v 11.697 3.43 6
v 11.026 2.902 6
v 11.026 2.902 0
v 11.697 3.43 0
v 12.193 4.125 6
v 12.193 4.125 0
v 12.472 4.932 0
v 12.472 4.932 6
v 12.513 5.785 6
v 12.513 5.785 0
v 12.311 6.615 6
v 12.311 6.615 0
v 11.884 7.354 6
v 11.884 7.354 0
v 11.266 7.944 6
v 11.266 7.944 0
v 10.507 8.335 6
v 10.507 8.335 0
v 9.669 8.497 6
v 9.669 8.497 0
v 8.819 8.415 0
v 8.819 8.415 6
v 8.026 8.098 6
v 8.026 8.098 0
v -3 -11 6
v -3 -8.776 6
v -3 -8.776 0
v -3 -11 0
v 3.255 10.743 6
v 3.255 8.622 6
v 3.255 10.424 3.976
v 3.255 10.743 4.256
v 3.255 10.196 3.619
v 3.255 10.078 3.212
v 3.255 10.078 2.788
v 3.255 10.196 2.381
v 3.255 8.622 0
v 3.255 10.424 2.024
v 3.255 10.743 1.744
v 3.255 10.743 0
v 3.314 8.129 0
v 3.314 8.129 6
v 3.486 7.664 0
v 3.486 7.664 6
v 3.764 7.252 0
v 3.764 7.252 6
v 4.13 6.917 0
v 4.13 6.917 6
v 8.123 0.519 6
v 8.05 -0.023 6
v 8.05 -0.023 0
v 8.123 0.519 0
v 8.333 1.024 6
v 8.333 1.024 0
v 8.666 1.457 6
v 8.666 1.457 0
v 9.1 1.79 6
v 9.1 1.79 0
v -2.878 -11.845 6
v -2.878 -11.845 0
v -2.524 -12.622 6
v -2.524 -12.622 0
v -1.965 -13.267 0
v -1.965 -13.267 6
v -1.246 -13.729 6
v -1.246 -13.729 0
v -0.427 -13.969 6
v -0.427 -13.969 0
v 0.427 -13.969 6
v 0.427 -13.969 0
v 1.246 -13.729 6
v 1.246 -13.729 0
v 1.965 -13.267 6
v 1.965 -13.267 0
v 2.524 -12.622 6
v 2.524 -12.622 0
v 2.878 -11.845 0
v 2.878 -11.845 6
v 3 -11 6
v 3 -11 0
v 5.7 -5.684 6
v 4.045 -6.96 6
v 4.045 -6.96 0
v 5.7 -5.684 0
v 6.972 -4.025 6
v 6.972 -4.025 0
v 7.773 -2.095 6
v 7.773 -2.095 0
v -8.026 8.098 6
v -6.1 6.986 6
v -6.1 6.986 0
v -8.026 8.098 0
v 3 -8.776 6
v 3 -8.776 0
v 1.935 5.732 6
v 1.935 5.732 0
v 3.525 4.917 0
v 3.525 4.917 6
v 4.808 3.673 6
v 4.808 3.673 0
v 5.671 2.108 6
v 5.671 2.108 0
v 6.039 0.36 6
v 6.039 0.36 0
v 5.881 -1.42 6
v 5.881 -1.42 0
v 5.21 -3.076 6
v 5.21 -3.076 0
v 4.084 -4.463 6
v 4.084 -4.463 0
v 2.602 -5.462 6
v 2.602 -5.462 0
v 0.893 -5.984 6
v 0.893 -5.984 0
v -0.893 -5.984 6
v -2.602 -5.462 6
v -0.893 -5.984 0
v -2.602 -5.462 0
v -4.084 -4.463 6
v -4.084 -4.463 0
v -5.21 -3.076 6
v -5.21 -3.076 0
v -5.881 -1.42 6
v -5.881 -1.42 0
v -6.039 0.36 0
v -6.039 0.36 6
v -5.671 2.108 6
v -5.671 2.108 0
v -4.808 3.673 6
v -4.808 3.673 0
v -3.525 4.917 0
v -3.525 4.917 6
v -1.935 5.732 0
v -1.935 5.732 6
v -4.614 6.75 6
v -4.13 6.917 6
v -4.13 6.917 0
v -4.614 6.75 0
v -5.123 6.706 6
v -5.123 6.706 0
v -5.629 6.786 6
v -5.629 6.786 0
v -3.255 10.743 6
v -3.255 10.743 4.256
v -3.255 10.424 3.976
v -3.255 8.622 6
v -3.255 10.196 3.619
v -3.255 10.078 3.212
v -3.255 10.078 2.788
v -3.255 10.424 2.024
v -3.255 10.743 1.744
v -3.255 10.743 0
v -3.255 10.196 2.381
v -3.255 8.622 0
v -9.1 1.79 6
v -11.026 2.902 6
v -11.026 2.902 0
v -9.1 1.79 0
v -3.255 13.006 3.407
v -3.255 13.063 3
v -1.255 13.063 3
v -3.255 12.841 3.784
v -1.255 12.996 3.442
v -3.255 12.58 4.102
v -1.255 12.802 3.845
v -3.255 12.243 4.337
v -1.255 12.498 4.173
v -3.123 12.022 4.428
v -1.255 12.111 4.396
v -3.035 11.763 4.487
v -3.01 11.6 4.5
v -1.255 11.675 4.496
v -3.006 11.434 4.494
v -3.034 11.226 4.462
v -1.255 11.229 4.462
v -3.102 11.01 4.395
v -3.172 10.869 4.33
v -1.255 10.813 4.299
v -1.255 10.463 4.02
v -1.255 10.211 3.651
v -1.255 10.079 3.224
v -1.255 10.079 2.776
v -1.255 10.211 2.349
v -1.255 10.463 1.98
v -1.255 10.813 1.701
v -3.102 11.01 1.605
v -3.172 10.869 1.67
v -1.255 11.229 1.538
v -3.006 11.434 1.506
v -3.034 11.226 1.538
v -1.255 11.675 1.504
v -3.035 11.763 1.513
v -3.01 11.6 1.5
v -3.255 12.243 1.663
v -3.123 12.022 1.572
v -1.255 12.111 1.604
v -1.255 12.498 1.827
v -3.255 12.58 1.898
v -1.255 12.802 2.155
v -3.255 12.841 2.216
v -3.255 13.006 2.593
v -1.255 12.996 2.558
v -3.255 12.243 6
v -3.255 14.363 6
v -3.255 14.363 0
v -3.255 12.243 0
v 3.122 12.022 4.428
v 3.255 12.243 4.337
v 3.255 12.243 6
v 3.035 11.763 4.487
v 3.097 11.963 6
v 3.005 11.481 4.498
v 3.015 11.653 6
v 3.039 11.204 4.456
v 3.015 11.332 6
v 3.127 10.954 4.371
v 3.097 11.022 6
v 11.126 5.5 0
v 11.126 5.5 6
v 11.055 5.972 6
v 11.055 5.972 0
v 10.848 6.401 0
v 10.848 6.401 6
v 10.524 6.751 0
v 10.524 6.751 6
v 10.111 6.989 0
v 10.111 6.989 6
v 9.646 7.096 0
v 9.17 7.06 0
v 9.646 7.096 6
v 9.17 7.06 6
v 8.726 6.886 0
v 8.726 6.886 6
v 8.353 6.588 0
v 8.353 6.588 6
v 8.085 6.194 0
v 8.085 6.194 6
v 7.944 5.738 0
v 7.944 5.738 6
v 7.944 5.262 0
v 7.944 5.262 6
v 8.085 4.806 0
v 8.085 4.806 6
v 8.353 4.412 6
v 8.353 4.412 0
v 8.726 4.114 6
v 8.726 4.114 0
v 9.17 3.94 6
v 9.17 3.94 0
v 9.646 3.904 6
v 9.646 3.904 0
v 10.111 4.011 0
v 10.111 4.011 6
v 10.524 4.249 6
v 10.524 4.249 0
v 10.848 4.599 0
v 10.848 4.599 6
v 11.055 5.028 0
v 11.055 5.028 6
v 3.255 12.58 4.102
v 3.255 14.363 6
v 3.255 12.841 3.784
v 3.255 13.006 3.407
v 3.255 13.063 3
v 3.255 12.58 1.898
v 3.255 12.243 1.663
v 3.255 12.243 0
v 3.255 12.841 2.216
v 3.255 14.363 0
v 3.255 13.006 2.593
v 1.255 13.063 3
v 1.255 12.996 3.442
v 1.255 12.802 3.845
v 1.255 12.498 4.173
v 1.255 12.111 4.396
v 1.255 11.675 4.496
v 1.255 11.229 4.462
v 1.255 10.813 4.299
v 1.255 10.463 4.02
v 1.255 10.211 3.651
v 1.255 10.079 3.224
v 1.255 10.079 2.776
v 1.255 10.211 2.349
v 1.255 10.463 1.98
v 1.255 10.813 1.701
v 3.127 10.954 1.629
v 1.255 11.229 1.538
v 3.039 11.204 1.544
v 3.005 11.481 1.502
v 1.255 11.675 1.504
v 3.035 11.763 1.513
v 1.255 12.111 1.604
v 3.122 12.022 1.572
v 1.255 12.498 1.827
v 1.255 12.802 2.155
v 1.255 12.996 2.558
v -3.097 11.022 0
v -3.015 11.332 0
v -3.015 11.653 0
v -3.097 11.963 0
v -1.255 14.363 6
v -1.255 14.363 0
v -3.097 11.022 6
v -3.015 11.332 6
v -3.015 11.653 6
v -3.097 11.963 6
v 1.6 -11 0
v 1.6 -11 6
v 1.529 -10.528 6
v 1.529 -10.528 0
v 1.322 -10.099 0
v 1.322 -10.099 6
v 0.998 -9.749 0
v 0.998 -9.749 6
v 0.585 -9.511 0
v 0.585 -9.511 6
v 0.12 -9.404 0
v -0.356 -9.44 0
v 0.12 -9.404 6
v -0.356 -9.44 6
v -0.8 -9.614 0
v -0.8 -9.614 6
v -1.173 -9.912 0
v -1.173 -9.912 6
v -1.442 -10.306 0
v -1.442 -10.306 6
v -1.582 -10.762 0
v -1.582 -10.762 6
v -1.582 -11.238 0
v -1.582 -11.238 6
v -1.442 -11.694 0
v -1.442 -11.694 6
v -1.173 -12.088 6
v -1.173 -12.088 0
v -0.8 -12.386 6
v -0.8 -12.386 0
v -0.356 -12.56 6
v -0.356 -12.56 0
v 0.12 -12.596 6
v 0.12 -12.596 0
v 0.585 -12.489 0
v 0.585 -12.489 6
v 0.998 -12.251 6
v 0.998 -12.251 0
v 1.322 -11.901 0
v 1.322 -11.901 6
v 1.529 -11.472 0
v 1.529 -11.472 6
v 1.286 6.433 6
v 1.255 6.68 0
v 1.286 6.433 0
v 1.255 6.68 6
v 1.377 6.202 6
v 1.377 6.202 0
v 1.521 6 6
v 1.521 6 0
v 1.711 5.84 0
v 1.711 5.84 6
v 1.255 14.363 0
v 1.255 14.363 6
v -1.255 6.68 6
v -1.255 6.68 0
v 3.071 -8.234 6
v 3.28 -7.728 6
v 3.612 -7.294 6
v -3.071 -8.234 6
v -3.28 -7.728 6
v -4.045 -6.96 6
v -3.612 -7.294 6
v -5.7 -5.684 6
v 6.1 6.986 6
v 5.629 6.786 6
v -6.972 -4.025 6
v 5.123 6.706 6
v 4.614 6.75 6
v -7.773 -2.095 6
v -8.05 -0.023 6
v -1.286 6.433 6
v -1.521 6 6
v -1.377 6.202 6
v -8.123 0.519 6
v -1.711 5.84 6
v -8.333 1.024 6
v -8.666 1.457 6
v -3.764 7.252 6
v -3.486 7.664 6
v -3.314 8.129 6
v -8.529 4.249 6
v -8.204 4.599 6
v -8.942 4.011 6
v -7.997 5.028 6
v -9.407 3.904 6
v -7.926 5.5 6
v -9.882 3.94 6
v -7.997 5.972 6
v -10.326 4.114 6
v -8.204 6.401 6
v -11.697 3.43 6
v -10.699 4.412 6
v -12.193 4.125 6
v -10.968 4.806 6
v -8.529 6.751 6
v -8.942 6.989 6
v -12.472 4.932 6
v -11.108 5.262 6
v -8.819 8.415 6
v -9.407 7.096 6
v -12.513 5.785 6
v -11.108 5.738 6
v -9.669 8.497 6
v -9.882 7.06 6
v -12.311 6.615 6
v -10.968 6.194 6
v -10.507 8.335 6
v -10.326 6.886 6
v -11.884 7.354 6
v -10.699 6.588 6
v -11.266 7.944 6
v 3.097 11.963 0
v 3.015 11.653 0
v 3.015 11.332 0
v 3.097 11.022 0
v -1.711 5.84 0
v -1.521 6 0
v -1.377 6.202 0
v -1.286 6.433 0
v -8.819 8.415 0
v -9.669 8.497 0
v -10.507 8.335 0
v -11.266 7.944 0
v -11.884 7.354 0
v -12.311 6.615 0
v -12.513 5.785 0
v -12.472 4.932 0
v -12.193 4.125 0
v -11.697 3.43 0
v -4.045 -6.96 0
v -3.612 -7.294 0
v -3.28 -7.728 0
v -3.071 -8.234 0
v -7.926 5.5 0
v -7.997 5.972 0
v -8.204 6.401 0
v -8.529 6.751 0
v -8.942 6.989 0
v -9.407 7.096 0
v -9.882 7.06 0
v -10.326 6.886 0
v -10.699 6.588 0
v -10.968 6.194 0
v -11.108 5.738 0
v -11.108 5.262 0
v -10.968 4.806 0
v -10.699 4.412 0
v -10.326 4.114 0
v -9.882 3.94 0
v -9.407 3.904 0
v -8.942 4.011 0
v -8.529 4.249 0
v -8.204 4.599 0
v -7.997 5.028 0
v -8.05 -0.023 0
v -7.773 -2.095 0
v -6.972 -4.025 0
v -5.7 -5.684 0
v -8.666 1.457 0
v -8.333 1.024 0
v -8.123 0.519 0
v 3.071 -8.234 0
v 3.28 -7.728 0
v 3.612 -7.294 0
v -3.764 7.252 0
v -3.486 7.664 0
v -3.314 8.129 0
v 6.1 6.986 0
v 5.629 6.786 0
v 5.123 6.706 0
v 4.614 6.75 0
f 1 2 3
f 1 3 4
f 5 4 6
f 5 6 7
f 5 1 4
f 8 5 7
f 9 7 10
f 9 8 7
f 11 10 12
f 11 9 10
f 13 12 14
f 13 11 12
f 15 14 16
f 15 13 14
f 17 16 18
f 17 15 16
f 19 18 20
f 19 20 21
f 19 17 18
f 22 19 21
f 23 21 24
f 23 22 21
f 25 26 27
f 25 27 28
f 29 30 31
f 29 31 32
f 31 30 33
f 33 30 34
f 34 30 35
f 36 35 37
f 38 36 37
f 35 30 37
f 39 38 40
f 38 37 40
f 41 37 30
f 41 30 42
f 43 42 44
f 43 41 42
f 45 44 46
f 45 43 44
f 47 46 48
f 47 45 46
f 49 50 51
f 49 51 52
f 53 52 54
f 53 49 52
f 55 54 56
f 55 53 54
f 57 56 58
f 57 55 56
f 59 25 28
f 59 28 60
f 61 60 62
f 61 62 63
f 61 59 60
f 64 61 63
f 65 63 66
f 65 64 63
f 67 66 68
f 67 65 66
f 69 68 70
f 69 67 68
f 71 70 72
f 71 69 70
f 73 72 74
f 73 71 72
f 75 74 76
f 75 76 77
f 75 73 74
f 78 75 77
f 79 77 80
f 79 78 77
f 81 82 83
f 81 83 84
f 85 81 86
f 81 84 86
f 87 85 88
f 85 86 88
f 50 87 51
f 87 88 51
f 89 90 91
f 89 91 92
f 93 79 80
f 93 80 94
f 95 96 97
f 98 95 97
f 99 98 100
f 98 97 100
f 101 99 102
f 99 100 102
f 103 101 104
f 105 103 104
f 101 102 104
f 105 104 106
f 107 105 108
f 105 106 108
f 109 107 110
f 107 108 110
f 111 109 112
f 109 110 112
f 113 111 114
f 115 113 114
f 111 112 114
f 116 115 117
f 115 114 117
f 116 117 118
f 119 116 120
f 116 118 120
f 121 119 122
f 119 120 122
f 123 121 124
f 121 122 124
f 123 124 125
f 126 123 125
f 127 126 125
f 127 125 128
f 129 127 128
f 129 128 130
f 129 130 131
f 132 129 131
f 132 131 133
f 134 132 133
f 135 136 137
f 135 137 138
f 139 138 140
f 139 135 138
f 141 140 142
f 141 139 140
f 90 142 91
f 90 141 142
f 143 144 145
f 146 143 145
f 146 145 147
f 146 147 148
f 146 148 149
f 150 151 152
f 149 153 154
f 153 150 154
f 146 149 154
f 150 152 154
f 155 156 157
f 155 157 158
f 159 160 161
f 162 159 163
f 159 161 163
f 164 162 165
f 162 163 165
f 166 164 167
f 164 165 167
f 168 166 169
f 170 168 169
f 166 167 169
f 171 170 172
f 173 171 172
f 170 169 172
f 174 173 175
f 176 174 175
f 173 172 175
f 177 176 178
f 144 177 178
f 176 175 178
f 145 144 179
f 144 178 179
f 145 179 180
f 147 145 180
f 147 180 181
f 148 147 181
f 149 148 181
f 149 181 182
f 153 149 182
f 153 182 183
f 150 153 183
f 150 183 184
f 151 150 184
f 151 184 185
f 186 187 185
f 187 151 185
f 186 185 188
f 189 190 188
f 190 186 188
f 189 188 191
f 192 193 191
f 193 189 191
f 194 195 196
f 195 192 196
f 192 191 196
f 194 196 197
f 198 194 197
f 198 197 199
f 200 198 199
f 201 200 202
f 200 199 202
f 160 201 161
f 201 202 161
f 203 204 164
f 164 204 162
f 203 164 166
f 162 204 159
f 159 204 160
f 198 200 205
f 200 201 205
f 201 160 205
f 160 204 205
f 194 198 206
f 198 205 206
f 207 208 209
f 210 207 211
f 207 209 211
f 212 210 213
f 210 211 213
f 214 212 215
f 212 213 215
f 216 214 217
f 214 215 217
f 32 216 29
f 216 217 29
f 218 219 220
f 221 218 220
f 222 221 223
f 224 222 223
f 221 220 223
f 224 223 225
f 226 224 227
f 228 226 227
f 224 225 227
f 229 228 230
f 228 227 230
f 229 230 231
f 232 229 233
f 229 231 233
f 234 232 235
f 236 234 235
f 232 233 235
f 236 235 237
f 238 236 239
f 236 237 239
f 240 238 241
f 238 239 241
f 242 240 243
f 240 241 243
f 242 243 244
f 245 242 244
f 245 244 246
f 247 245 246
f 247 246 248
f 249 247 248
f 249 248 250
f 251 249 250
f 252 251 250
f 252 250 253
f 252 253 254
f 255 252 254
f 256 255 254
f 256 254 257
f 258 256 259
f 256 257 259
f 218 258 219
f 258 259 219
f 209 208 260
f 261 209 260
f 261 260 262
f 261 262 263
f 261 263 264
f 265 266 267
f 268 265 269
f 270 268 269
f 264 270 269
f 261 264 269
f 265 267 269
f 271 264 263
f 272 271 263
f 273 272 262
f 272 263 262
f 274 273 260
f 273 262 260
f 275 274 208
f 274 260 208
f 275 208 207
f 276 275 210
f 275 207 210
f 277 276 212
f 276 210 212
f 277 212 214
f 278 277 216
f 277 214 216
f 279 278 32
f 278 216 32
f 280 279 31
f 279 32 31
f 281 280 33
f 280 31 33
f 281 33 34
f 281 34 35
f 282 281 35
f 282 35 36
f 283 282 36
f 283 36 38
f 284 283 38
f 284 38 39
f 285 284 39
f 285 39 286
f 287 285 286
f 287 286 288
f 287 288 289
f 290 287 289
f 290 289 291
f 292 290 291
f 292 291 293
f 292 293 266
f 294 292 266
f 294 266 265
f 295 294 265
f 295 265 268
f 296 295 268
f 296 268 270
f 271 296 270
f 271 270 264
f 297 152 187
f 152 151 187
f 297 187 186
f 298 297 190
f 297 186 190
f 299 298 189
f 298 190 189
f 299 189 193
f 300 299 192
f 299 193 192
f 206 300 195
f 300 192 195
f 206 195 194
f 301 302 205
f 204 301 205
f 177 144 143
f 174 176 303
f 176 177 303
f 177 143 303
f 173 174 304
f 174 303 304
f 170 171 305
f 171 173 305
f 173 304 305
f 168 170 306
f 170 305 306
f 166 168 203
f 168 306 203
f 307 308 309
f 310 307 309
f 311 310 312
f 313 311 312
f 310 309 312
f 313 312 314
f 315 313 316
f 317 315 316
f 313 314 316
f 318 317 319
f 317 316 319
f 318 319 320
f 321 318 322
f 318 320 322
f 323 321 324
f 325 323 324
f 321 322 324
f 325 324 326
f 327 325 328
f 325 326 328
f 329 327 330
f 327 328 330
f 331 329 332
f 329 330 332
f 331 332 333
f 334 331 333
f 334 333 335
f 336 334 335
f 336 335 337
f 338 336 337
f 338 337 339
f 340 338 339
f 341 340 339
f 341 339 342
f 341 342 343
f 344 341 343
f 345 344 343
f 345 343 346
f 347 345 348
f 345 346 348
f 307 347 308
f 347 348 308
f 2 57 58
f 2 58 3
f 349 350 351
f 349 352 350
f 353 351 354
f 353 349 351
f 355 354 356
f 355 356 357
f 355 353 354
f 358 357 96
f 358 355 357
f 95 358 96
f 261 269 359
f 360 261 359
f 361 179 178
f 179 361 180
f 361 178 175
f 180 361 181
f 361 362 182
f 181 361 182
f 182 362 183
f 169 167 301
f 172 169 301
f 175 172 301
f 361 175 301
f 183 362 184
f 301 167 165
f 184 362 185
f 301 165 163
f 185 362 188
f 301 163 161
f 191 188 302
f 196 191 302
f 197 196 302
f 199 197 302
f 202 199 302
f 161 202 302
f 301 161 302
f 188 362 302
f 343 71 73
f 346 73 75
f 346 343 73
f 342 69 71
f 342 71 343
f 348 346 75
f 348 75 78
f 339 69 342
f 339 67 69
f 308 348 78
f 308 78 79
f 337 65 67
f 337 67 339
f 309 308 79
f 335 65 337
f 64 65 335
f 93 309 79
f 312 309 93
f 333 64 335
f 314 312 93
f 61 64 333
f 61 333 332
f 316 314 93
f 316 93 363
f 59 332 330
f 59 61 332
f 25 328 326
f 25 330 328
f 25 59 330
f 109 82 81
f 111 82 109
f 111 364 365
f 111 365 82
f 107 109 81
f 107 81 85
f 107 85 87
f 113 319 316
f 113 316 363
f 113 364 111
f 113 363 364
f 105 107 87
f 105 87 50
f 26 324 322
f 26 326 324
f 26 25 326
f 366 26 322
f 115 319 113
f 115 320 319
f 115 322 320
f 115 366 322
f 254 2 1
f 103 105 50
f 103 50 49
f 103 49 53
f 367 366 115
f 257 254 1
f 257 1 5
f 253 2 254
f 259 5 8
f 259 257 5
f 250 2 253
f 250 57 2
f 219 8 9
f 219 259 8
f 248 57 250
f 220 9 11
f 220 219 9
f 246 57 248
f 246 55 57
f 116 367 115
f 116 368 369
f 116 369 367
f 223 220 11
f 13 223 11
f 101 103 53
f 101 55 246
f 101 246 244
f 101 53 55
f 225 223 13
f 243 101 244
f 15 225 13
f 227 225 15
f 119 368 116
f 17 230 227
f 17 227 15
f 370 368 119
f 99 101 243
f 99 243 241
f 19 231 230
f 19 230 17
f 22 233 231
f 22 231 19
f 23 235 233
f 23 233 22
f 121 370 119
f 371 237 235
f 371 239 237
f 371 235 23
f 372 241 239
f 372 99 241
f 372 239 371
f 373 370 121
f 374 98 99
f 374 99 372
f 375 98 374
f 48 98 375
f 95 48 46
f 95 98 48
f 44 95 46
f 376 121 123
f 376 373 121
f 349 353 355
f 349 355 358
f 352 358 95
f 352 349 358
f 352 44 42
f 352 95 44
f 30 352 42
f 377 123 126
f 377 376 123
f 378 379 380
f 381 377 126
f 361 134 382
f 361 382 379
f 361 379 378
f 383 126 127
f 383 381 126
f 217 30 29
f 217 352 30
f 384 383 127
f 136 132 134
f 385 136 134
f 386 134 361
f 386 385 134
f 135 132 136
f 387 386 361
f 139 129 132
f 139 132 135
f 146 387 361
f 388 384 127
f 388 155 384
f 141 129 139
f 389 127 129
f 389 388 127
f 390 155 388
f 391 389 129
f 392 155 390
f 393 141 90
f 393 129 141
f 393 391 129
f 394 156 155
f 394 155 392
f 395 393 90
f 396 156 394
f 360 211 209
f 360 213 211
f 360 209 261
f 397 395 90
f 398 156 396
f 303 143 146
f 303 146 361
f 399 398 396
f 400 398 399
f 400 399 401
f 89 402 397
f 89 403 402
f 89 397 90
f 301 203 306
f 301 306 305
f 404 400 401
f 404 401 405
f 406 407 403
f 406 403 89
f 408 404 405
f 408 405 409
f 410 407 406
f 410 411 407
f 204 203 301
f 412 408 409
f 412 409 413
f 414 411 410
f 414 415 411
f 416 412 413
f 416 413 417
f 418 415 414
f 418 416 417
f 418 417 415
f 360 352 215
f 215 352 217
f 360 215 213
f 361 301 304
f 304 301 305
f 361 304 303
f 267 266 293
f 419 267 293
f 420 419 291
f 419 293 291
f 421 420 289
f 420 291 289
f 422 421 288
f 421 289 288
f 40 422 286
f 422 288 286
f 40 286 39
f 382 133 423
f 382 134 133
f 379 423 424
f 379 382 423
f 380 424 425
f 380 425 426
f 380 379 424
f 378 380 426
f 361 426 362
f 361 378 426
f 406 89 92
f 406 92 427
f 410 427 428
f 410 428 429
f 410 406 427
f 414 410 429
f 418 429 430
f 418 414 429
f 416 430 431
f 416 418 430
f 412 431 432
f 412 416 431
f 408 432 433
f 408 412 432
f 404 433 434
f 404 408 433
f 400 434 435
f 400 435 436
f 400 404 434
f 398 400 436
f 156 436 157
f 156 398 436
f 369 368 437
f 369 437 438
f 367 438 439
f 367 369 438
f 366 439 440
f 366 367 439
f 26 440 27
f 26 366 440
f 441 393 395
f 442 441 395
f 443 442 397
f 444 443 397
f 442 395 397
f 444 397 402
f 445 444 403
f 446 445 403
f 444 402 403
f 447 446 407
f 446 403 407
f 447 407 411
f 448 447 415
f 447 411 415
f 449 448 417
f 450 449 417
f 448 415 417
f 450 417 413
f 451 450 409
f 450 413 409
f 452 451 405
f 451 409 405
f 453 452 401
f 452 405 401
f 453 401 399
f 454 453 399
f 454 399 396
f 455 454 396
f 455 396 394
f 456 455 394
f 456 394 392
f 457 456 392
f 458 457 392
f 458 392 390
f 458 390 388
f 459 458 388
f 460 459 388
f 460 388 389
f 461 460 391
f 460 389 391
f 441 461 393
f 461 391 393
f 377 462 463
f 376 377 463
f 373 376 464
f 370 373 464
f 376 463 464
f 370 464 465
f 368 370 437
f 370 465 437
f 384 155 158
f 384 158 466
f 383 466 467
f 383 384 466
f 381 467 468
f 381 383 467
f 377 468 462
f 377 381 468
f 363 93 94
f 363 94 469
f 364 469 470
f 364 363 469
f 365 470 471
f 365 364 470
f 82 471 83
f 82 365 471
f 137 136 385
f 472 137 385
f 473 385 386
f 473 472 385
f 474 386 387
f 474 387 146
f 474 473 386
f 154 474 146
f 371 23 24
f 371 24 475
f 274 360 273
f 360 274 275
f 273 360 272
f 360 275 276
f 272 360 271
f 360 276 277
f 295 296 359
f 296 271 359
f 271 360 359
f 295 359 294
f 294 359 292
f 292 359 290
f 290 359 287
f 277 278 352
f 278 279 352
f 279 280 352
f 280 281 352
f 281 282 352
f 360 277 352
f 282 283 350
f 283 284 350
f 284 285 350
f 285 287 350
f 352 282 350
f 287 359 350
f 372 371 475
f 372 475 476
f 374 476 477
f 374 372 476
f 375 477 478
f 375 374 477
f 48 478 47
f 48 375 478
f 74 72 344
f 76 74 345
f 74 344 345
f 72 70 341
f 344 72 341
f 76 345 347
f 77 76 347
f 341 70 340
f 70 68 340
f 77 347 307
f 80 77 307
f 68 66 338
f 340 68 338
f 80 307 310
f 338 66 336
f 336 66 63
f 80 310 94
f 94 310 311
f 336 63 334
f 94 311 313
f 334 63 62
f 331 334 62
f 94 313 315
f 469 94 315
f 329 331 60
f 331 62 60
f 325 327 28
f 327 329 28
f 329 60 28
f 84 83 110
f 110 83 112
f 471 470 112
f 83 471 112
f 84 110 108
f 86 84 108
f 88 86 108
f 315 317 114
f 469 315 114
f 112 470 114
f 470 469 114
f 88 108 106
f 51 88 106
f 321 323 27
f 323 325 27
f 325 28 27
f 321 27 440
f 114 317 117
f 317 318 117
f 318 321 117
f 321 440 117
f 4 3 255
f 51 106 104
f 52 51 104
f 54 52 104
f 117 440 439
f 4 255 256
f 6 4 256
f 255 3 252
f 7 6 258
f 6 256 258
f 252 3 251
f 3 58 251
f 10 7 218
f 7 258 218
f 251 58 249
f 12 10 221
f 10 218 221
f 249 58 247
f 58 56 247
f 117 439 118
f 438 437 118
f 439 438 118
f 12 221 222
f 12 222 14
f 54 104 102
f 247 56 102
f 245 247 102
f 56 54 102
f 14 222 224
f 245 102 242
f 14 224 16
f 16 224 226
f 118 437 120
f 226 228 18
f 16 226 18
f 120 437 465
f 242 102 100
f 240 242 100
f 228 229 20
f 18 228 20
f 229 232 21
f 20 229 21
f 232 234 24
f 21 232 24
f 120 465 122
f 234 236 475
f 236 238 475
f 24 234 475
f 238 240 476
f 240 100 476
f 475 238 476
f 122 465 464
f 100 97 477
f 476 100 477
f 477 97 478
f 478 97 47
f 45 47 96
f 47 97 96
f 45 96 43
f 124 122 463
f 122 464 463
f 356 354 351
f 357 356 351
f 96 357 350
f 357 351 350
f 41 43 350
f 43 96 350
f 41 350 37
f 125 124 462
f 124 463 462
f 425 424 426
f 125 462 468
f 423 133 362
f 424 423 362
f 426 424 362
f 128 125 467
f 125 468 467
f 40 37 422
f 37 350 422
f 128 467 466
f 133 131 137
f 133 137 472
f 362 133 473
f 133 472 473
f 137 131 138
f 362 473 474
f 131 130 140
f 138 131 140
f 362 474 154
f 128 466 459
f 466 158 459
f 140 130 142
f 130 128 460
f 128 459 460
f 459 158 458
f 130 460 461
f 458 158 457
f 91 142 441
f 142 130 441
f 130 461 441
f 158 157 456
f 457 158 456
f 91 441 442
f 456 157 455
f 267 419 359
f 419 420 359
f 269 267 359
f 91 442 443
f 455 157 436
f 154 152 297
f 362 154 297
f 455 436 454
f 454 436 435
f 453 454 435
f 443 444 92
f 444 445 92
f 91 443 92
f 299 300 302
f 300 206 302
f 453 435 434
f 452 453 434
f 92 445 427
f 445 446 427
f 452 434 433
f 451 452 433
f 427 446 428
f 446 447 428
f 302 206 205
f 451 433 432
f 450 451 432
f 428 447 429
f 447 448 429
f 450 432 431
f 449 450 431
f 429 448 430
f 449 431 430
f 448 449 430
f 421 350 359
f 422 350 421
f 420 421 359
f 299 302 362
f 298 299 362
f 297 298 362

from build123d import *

# Parameters (mm, degrees)
EXTRUDE_1_DEPTH     = 6
SKETCH_2_R          = 1.5
CUT_EXTRUDE_1_DEPTH = 20.23763281
SKETCH_3_R          = 1.6
EXTRUDE_2_DEPTH     = 6
FILLET_1_R          = 2.1
FILLET_2_R          = 1
SKETCH_4_R          = 1.25
CUT_EXTRUDE_2_DEPTH = 20.979768962


with BuildPart() as part:
    # ｽｹｯﾁ1 → ﾎﾞｽ - 押し出し1 (new body)
    with BuildSketch(Plane.XY):
        with BuildLine():
            Line((-1.255, 5.918401389), (-1.255, 14.36257258))
            Line((-1.255, 14.36257258), (-3.255, 14.36257258))
            Line((-3.255, 14.36257258), (-3.255, 7.36257258))
            ThreePointArc((-3.255, 7.36257258), (0, -8.05), (3.255, 7.36257258))
            Line((3.255, 7.36257258), (3.255, 14.36257258))
            Line((3.255, 14.36257258), (1.255, 14.36257258))
            Line((1.255, 14.36257258), (1.255, 5.918401389))
            ThreePointArc((1.255, 5.918401389), (0, -6.05), (-1.255, 5.918401389))
        make_face()
    extrude(amount=EXTRUDE_1_DEPTH)

    # ｽｹｯﾁ2 → ｶｯﾄ - 押し出し1 (cut, through all)
    with BuildSketch(Plane(origin=(3.255, 0, 0), x_dir=(0, 0, -1), z_dir=(1, 0, 0))):
        with Locations(Location((-3, 11.56257258, 0), (0, 0, 90))):
            Circle(SKETCH_2_R)
    extrude(amount=-CUT_EXTRUDE_1_DEPTH, mode=Mode.SUBTRACT)

    # ｽｹｯﾁ3 → ﾎﾞｽ - 押し出し2 (add, through all)
    # profile 1 of 3: a face of its own
    with BuildSketch(Plane.XY.offset(6)):
        with BuildLine():
            Line((-4.969302513, 6.333129758), (-8.026279442, 8.098076211))
            ThreePointArc((-8.026279442, 8.098076211), (-12.124355653, 7), (-11.026279442, 2.901923789))
            Line((-11.026279442, 2.901923789), (-7.969302513, 1.136977336))
            ThreePointArc((-7.969302513, 1.136977336), (-6.9715045, 4.025), (-4.969302513, 6.333129758))
        make_face()
        with Locations((-9.526279442, 5.5)):
            Circle(SKETCH_3_R, mode=Mode.SUBTRACT)
    # profile 2 of 3: a face of its own
    with BuildSketch(Plane.XY.offset(6)):
        with BuildLine():
            Line((8.026279442, 8.098076211), (4.969302513, 6.333129758))
            ThreePointArc((4.969302513, 6.333129758), (6.9715045, 4.025), (7.969302513, 1.136977336))
            Line((7.969302513, 1.136977336), (11.026279442, 2.901923789))
            ThreePointArc((11.026279442, 2.901923789), (12.124355653, 7), (8.026279442, 8.098076211))
        make_face()
        with Locations((9.526279442, 5.5)):
            Circle(SKETCH_3_R, mode=Mode.SUBTRACT)
    # profile 3 of 3: a face of its own
    with BuildSketch(Plane.XY.offset(6)):
        with BuildLine():
            Line((3, -11), (3, -7.470107094))
            ThreePointArc((3, -7.470107094), (0, -8.05), (-3, -7.470107094))
            Line((-3, -7.470107094), (-3, -11))
            ThreePointArc((-3, -11), (0, -14), (3, -11))
        make_face()
        with Locations((0, -11)):
            Circle(SKETCH_3_R, mode=Mode.SUBTRACT)
    extrude(amount=-EXTRUDE_2_DEPTH)

    # ﾌｨﾚｯﾄ1
    # the kernel refuses this fillet: 2.1 mm, written as the material it adds along each edge
    with BuildSketch(Plane(origin=(3.255, 7.36257258, 0), x_dir=(0.8842030952275957, -0.46710265080594376, 0), z_dir=(0, 0, 1))) as fillet_1_piece_1:
        with BuildLine():
            CenterArc((1.268338995, 2.094894415), FILLET_1_R, 207.846387093, 58.157490839)
            Line((-0.588487505, 1.113978849), (0, 0))
            ThreePointArc((0, 0), (0.560996094, 0.019571407), (1.121992188, 0))
        make_face()
    extrude(amount=6)
    with BuildSketch(Plane(origin=(-3.255, 7.36257258, 0), x_dir=(0, 1, 0), z_dir=(0, 0, 1))) as fillet_1_piece_2:
        with BuildLine():
            CenterArc((1.25986762, 2.1), FILLET_1_R, 211.842509161, 58.157490839)
            ThreePointArc((-0.524085525, 0.992068966), (-0.244737664, 0.505176339), (0, 0))
            Line((0, 0), (1.25986762, 0))
        make_face()
    extrude(amount=6)
    with BuildSketch(Plane(origin=(-4.969302513, 6.333129758, 6), x_dir=(0.8292498658950391, 0.5588780367066322, 0), z_dir=(0, 0, -1)), Plane(origin=(7.969302513, 1.136977336, 6), x_dir=(0.06937764445759169, -0.9975904683032591, 0), z_dir=(0, 0, -1)), Plane(origin=(-3, -7.470107094, 6), x_dir=(-0.8986275103526323, 0.4387124315966321, 0), z_dir=(0, 0, -1))) as fillet_1_piece_3:
        with BuildLine():
            CenterArc((1.314348194, -2.094516792), FILLET_1_R, 94.141330549, 59.836911418)
            Line((-0.572769578, -1.173220685), (0, 0))
            ThreePointArc((0, 0), (0.581346317, -0.021018965), (1.162692633, 0))
        make_face()
    extrude(amount=6)
    with BuildSketch(Plane(origin=(-7.969302513, 1.136977336, 6), x_dir=(-0.06937764445760207, -0.9975904683032585, 0), z_dir=(0, 0, -1)), Plane(origin=(4.969302513, 6.333129758, 6), x_dir=(-0.8292498658950355, 0.5588780367066375, 0), z_dir=(0, 0, -1)), Plane(origin=(3, -7.470107094, 6), x_dir=(0.8986275103526384, 0.43871243159661977, 0), z_dir=(0, 0, -1))) as fillet_1_piece_4:
        with BuildLine():
            CenterArc((1.314348194, 2.094516792), FILLET_1_R, 206.021758033, 59.836911418)
            Line((-0.572769578, 1.173220685), (0, 0))
            ThreePointArc((0, 0), (0.581346317, 0.021018965), (1.162692633, 0))
        make_face()
    extrude(amount=6)

    # ﾌｨﾚｯﾄ2
    fillet_2_edges = [part.edges().sort_by_distance(p)[0] for p in [
        (1.255, 5.918401389, 3),
        (-1.255, 5.918401389, 3),
    ]]
    fillet(fillet_2_edges, radius=FILLET_2_R)

    # ｽｹｯﾁ4 → ｶｯﾄ - 押し出し2 (cut, through all)
    with BuildSketch(Plane.XY.offset(6)):
        with Locations((4.255, 11.49250639)):
            Circle(SKETCH_4_R)
        with Locations((-4.255, 11.49250639)):
            Circle(SKETCH_4_R)
    extrude(amount=-CUT_EXTRUDE_2_DEPTH, mode=Mode.SUBTRACT)


solid = part.part
